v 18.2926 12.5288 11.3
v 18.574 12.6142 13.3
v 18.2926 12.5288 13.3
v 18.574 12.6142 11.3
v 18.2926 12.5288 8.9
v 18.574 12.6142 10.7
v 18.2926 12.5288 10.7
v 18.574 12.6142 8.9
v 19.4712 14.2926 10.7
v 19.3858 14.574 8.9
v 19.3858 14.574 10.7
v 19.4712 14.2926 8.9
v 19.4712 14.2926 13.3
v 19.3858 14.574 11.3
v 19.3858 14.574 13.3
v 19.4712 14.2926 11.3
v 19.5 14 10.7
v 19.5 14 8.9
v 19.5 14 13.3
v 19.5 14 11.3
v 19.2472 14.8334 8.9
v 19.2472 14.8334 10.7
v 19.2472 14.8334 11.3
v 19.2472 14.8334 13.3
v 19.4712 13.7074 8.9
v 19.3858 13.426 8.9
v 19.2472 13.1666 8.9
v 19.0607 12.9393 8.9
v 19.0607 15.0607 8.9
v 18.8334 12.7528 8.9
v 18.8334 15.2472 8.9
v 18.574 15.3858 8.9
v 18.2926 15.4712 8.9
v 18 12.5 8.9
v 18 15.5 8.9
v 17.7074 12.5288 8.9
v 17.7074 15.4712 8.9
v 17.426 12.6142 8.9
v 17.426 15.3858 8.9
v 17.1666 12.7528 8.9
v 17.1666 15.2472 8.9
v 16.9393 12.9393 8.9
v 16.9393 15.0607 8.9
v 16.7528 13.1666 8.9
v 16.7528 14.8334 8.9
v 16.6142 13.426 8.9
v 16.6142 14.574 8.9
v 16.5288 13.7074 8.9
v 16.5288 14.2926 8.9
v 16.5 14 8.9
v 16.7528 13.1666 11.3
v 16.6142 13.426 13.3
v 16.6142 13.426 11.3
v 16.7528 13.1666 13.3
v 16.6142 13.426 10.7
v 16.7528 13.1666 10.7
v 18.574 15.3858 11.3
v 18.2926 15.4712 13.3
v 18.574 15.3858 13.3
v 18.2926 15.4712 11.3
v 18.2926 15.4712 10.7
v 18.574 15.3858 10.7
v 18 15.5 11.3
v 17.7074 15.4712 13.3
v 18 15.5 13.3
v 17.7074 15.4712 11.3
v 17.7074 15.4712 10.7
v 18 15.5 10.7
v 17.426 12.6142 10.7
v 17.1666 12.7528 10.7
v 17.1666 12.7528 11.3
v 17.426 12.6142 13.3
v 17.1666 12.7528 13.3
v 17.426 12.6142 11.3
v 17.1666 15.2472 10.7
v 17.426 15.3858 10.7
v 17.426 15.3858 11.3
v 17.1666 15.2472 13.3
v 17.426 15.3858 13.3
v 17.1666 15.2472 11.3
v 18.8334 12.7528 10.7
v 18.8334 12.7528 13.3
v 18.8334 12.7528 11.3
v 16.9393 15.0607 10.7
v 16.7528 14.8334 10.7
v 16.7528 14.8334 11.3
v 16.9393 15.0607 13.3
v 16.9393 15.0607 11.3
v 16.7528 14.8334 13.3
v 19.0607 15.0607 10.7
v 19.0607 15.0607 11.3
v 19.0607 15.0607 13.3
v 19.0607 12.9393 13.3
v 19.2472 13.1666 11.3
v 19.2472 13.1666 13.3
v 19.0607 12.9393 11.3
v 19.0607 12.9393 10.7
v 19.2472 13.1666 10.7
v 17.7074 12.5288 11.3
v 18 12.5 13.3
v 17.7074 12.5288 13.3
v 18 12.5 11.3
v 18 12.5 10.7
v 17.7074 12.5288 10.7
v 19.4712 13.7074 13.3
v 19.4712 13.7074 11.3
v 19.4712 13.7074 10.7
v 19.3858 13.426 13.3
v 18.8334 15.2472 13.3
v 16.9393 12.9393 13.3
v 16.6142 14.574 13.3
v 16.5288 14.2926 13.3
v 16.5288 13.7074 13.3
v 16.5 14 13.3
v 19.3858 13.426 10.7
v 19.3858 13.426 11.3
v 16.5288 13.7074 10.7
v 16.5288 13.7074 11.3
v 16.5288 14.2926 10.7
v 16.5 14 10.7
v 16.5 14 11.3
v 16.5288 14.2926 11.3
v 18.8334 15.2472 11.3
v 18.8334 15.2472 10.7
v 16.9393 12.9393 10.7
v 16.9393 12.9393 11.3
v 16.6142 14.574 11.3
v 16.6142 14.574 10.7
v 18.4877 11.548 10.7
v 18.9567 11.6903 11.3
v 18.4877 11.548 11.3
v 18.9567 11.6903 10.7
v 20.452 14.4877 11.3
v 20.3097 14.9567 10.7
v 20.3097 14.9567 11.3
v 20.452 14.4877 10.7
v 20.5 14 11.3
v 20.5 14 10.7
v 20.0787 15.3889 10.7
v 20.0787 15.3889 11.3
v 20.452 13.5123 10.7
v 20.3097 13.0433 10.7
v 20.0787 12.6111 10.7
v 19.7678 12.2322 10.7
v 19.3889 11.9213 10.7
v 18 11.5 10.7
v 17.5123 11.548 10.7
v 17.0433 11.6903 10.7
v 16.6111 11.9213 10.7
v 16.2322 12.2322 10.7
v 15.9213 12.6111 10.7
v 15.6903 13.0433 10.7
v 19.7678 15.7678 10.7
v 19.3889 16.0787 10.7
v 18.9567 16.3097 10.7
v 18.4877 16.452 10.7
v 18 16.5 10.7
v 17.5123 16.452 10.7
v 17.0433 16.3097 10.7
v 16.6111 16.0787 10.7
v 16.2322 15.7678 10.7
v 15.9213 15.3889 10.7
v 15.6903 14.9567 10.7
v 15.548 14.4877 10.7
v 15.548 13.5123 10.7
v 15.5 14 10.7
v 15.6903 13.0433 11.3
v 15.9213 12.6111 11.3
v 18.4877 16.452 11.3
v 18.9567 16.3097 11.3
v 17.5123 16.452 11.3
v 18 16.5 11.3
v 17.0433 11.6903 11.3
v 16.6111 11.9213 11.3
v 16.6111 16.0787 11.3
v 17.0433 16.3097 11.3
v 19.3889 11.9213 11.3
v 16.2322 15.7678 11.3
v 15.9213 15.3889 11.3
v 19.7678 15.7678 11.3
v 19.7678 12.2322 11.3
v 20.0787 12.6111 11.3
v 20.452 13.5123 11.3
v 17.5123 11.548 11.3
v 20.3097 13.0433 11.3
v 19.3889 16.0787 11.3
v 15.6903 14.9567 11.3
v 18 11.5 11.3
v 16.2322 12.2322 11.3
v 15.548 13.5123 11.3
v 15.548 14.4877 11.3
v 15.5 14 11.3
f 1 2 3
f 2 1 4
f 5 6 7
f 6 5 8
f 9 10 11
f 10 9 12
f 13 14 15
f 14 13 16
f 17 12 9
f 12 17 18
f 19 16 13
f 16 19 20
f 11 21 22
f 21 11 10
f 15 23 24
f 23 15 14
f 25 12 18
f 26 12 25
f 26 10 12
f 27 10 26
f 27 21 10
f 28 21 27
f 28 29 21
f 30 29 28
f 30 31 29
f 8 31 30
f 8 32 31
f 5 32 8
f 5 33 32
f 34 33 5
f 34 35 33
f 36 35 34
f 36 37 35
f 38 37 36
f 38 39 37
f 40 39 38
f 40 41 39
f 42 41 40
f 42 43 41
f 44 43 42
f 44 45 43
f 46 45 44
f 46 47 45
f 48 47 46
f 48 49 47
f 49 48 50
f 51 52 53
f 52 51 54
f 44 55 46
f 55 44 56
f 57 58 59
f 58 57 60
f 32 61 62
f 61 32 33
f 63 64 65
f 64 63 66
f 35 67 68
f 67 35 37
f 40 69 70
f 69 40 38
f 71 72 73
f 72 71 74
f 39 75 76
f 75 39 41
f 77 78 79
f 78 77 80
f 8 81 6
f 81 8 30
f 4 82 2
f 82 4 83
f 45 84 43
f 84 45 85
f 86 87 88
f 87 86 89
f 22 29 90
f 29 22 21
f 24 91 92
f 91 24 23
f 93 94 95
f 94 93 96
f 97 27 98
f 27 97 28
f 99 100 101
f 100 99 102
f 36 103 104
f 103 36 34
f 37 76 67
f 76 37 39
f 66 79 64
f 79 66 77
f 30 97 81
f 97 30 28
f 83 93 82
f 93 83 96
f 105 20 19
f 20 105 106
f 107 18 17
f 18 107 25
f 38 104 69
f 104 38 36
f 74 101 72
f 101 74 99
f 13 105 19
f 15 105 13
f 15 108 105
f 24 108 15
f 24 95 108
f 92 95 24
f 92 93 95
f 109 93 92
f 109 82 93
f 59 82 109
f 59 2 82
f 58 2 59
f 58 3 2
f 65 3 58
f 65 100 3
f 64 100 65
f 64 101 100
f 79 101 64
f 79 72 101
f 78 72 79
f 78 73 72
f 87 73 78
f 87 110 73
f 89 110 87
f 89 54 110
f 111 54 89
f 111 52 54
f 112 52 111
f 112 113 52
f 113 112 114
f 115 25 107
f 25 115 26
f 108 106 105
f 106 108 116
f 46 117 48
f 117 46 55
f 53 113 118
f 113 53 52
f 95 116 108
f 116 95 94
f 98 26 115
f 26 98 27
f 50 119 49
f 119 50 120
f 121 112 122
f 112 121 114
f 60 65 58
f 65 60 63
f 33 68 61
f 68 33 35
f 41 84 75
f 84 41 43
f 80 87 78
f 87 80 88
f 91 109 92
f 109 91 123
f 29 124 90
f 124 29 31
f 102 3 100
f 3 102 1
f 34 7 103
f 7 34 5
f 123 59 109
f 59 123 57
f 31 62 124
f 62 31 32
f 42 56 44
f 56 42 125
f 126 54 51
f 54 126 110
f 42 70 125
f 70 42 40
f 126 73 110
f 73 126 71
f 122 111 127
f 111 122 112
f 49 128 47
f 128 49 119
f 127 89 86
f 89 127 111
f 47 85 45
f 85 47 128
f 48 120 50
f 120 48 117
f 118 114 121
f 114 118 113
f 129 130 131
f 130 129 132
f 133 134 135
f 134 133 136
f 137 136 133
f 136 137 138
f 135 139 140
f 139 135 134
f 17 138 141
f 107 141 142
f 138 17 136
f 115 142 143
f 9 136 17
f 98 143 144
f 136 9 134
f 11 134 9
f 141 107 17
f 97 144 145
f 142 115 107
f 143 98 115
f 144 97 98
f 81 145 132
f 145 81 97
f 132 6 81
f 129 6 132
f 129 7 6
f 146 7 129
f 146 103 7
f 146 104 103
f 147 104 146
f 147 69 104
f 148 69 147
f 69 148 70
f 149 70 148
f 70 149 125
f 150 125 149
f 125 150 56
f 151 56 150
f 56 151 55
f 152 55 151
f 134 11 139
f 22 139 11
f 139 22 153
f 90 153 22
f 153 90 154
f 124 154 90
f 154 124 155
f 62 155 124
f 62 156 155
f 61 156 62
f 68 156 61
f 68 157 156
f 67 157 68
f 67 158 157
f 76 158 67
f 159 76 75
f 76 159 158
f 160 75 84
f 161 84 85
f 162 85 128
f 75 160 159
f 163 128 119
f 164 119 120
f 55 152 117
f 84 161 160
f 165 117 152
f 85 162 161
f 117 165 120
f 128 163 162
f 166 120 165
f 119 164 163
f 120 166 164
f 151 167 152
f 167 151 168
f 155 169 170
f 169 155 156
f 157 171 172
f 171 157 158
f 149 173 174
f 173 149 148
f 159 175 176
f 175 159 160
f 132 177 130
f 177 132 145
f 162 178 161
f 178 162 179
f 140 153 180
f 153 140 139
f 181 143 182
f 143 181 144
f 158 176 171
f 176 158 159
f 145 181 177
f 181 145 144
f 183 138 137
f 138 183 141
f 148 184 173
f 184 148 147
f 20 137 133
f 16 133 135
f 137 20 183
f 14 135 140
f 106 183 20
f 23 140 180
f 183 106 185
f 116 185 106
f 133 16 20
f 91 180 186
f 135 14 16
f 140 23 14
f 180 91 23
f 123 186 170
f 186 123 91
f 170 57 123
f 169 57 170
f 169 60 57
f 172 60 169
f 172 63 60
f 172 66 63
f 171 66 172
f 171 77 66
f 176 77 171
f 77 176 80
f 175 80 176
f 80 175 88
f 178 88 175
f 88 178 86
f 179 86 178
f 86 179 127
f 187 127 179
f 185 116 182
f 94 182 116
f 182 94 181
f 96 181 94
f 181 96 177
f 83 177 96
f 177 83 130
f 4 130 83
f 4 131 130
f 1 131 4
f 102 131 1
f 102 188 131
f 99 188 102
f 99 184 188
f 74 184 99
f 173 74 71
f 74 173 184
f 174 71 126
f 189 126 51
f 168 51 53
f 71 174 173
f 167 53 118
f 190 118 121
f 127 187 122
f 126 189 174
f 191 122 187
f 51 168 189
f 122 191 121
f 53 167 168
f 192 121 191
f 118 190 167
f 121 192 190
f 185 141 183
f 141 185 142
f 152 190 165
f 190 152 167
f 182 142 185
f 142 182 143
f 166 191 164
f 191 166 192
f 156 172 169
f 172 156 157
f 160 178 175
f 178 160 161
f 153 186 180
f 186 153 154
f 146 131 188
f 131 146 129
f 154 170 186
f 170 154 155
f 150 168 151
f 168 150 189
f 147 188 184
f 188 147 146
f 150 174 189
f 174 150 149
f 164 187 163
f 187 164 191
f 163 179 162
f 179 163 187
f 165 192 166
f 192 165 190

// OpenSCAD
// The cap SW1 of the housing "usbc_parts", written by enclosure-nv 0.1.0
// from the board file usbc_board.kicad_pcb.  Render with OpenSCAD.
// Parameters, in millimetres.  The same block heads every file of this housing:
// when a value is changed, change it in each file.
wall = 2.4;
floor_t = 2.4;
lid_t = 1.6;
clear = 0.5;  // the board's edge to the inside of the wall
standoff_d = 6;
screw_d = 2.5;
pilot_d = 2.1;
head_d = 5;
head_h = 1.6;
lip_h = 3;  // the height of the step the lid sits on
lid_gap = 0.2;
snap_depth = 0.4;
snap_h = 0.8;
led_d = 3;
button_d = 3;
board_t = 1.6;
standoff_h = 3;  // the space under the board
top_space = 4.3;  // the space above the board
pilot_len = 3.5;  // the depth of the screw's hole
print_flip = false;  // true lays the lid plate down

// Levels along z.
z_bb = floor_t + standoff_h;
z_bt = z_bb + board_t;
z_split = z_bt + top_space;
z_step = z_split - lip_h;
z_top = z_split + lid_t;
z_skirt = z_step + lid_gap;
a_in = wall / 2;
screw_clear = screw_d + 0.3;

module cap_SW1() {
  union() {
    translate([18, 14, z_bt + (1.9)]) cylinder(h = z_top + 0.4 - (z_bt + (1.9)), d = button_d, $fn = 32);
    translate([18, 14, z_split - 0.6]) cylinder(h = 0.6, d = button_d + 2, $fn = 32);
  }
}

cap_SW1();
